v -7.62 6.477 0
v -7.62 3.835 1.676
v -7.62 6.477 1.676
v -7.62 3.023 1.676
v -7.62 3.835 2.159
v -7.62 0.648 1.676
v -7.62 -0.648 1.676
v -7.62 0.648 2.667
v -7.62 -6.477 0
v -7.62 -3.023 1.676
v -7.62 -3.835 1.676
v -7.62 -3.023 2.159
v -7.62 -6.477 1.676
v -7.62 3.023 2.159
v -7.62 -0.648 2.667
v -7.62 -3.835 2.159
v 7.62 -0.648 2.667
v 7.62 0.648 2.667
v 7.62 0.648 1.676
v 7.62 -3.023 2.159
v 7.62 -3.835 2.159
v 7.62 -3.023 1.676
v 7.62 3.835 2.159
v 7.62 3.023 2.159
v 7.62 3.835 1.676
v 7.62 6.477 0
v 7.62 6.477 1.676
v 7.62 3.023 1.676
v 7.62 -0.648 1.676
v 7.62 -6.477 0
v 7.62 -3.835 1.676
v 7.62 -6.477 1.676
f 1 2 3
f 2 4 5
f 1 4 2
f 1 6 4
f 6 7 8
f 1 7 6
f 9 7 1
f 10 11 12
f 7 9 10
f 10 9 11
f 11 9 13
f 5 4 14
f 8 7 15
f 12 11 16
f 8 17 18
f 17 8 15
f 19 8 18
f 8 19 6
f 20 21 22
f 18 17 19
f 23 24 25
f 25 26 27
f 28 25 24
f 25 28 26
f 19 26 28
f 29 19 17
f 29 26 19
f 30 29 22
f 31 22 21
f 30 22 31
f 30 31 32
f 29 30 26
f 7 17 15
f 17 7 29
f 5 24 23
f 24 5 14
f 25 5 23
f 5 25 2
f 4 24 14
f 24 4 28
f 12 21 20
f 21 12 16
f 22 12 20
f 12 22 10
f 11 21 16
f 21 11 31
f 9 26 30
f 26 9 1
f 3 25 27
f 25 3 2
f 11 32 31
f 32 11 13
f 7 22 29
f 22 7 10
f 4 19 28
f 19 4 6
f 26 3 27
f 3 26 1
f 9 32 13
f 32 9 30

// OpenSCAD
ViewScale = [0.0254, 0.0254, 0.0254];

module model_levelshifter()
{
    color("Cyan")
    linear_extrude(66)
    square([600, 510], center=true);

    color("CornflowerBlue")
    {
        // FETs
        translate([0, 0, 65])
        linear_extrude(40)
        square([600, 51], center=true);

        // Resistors
        translate([0, 510/2-20/2-110, 65])
        linear_extrude(20)
        square([600, 32], center=true);

        translate([0, -510/2+20/2+110, 65])
        linear_extrude(20)
        square([600, 32], center=true);
    }


}

scale(ViewScale)
{
    model_levelshifter();
}
